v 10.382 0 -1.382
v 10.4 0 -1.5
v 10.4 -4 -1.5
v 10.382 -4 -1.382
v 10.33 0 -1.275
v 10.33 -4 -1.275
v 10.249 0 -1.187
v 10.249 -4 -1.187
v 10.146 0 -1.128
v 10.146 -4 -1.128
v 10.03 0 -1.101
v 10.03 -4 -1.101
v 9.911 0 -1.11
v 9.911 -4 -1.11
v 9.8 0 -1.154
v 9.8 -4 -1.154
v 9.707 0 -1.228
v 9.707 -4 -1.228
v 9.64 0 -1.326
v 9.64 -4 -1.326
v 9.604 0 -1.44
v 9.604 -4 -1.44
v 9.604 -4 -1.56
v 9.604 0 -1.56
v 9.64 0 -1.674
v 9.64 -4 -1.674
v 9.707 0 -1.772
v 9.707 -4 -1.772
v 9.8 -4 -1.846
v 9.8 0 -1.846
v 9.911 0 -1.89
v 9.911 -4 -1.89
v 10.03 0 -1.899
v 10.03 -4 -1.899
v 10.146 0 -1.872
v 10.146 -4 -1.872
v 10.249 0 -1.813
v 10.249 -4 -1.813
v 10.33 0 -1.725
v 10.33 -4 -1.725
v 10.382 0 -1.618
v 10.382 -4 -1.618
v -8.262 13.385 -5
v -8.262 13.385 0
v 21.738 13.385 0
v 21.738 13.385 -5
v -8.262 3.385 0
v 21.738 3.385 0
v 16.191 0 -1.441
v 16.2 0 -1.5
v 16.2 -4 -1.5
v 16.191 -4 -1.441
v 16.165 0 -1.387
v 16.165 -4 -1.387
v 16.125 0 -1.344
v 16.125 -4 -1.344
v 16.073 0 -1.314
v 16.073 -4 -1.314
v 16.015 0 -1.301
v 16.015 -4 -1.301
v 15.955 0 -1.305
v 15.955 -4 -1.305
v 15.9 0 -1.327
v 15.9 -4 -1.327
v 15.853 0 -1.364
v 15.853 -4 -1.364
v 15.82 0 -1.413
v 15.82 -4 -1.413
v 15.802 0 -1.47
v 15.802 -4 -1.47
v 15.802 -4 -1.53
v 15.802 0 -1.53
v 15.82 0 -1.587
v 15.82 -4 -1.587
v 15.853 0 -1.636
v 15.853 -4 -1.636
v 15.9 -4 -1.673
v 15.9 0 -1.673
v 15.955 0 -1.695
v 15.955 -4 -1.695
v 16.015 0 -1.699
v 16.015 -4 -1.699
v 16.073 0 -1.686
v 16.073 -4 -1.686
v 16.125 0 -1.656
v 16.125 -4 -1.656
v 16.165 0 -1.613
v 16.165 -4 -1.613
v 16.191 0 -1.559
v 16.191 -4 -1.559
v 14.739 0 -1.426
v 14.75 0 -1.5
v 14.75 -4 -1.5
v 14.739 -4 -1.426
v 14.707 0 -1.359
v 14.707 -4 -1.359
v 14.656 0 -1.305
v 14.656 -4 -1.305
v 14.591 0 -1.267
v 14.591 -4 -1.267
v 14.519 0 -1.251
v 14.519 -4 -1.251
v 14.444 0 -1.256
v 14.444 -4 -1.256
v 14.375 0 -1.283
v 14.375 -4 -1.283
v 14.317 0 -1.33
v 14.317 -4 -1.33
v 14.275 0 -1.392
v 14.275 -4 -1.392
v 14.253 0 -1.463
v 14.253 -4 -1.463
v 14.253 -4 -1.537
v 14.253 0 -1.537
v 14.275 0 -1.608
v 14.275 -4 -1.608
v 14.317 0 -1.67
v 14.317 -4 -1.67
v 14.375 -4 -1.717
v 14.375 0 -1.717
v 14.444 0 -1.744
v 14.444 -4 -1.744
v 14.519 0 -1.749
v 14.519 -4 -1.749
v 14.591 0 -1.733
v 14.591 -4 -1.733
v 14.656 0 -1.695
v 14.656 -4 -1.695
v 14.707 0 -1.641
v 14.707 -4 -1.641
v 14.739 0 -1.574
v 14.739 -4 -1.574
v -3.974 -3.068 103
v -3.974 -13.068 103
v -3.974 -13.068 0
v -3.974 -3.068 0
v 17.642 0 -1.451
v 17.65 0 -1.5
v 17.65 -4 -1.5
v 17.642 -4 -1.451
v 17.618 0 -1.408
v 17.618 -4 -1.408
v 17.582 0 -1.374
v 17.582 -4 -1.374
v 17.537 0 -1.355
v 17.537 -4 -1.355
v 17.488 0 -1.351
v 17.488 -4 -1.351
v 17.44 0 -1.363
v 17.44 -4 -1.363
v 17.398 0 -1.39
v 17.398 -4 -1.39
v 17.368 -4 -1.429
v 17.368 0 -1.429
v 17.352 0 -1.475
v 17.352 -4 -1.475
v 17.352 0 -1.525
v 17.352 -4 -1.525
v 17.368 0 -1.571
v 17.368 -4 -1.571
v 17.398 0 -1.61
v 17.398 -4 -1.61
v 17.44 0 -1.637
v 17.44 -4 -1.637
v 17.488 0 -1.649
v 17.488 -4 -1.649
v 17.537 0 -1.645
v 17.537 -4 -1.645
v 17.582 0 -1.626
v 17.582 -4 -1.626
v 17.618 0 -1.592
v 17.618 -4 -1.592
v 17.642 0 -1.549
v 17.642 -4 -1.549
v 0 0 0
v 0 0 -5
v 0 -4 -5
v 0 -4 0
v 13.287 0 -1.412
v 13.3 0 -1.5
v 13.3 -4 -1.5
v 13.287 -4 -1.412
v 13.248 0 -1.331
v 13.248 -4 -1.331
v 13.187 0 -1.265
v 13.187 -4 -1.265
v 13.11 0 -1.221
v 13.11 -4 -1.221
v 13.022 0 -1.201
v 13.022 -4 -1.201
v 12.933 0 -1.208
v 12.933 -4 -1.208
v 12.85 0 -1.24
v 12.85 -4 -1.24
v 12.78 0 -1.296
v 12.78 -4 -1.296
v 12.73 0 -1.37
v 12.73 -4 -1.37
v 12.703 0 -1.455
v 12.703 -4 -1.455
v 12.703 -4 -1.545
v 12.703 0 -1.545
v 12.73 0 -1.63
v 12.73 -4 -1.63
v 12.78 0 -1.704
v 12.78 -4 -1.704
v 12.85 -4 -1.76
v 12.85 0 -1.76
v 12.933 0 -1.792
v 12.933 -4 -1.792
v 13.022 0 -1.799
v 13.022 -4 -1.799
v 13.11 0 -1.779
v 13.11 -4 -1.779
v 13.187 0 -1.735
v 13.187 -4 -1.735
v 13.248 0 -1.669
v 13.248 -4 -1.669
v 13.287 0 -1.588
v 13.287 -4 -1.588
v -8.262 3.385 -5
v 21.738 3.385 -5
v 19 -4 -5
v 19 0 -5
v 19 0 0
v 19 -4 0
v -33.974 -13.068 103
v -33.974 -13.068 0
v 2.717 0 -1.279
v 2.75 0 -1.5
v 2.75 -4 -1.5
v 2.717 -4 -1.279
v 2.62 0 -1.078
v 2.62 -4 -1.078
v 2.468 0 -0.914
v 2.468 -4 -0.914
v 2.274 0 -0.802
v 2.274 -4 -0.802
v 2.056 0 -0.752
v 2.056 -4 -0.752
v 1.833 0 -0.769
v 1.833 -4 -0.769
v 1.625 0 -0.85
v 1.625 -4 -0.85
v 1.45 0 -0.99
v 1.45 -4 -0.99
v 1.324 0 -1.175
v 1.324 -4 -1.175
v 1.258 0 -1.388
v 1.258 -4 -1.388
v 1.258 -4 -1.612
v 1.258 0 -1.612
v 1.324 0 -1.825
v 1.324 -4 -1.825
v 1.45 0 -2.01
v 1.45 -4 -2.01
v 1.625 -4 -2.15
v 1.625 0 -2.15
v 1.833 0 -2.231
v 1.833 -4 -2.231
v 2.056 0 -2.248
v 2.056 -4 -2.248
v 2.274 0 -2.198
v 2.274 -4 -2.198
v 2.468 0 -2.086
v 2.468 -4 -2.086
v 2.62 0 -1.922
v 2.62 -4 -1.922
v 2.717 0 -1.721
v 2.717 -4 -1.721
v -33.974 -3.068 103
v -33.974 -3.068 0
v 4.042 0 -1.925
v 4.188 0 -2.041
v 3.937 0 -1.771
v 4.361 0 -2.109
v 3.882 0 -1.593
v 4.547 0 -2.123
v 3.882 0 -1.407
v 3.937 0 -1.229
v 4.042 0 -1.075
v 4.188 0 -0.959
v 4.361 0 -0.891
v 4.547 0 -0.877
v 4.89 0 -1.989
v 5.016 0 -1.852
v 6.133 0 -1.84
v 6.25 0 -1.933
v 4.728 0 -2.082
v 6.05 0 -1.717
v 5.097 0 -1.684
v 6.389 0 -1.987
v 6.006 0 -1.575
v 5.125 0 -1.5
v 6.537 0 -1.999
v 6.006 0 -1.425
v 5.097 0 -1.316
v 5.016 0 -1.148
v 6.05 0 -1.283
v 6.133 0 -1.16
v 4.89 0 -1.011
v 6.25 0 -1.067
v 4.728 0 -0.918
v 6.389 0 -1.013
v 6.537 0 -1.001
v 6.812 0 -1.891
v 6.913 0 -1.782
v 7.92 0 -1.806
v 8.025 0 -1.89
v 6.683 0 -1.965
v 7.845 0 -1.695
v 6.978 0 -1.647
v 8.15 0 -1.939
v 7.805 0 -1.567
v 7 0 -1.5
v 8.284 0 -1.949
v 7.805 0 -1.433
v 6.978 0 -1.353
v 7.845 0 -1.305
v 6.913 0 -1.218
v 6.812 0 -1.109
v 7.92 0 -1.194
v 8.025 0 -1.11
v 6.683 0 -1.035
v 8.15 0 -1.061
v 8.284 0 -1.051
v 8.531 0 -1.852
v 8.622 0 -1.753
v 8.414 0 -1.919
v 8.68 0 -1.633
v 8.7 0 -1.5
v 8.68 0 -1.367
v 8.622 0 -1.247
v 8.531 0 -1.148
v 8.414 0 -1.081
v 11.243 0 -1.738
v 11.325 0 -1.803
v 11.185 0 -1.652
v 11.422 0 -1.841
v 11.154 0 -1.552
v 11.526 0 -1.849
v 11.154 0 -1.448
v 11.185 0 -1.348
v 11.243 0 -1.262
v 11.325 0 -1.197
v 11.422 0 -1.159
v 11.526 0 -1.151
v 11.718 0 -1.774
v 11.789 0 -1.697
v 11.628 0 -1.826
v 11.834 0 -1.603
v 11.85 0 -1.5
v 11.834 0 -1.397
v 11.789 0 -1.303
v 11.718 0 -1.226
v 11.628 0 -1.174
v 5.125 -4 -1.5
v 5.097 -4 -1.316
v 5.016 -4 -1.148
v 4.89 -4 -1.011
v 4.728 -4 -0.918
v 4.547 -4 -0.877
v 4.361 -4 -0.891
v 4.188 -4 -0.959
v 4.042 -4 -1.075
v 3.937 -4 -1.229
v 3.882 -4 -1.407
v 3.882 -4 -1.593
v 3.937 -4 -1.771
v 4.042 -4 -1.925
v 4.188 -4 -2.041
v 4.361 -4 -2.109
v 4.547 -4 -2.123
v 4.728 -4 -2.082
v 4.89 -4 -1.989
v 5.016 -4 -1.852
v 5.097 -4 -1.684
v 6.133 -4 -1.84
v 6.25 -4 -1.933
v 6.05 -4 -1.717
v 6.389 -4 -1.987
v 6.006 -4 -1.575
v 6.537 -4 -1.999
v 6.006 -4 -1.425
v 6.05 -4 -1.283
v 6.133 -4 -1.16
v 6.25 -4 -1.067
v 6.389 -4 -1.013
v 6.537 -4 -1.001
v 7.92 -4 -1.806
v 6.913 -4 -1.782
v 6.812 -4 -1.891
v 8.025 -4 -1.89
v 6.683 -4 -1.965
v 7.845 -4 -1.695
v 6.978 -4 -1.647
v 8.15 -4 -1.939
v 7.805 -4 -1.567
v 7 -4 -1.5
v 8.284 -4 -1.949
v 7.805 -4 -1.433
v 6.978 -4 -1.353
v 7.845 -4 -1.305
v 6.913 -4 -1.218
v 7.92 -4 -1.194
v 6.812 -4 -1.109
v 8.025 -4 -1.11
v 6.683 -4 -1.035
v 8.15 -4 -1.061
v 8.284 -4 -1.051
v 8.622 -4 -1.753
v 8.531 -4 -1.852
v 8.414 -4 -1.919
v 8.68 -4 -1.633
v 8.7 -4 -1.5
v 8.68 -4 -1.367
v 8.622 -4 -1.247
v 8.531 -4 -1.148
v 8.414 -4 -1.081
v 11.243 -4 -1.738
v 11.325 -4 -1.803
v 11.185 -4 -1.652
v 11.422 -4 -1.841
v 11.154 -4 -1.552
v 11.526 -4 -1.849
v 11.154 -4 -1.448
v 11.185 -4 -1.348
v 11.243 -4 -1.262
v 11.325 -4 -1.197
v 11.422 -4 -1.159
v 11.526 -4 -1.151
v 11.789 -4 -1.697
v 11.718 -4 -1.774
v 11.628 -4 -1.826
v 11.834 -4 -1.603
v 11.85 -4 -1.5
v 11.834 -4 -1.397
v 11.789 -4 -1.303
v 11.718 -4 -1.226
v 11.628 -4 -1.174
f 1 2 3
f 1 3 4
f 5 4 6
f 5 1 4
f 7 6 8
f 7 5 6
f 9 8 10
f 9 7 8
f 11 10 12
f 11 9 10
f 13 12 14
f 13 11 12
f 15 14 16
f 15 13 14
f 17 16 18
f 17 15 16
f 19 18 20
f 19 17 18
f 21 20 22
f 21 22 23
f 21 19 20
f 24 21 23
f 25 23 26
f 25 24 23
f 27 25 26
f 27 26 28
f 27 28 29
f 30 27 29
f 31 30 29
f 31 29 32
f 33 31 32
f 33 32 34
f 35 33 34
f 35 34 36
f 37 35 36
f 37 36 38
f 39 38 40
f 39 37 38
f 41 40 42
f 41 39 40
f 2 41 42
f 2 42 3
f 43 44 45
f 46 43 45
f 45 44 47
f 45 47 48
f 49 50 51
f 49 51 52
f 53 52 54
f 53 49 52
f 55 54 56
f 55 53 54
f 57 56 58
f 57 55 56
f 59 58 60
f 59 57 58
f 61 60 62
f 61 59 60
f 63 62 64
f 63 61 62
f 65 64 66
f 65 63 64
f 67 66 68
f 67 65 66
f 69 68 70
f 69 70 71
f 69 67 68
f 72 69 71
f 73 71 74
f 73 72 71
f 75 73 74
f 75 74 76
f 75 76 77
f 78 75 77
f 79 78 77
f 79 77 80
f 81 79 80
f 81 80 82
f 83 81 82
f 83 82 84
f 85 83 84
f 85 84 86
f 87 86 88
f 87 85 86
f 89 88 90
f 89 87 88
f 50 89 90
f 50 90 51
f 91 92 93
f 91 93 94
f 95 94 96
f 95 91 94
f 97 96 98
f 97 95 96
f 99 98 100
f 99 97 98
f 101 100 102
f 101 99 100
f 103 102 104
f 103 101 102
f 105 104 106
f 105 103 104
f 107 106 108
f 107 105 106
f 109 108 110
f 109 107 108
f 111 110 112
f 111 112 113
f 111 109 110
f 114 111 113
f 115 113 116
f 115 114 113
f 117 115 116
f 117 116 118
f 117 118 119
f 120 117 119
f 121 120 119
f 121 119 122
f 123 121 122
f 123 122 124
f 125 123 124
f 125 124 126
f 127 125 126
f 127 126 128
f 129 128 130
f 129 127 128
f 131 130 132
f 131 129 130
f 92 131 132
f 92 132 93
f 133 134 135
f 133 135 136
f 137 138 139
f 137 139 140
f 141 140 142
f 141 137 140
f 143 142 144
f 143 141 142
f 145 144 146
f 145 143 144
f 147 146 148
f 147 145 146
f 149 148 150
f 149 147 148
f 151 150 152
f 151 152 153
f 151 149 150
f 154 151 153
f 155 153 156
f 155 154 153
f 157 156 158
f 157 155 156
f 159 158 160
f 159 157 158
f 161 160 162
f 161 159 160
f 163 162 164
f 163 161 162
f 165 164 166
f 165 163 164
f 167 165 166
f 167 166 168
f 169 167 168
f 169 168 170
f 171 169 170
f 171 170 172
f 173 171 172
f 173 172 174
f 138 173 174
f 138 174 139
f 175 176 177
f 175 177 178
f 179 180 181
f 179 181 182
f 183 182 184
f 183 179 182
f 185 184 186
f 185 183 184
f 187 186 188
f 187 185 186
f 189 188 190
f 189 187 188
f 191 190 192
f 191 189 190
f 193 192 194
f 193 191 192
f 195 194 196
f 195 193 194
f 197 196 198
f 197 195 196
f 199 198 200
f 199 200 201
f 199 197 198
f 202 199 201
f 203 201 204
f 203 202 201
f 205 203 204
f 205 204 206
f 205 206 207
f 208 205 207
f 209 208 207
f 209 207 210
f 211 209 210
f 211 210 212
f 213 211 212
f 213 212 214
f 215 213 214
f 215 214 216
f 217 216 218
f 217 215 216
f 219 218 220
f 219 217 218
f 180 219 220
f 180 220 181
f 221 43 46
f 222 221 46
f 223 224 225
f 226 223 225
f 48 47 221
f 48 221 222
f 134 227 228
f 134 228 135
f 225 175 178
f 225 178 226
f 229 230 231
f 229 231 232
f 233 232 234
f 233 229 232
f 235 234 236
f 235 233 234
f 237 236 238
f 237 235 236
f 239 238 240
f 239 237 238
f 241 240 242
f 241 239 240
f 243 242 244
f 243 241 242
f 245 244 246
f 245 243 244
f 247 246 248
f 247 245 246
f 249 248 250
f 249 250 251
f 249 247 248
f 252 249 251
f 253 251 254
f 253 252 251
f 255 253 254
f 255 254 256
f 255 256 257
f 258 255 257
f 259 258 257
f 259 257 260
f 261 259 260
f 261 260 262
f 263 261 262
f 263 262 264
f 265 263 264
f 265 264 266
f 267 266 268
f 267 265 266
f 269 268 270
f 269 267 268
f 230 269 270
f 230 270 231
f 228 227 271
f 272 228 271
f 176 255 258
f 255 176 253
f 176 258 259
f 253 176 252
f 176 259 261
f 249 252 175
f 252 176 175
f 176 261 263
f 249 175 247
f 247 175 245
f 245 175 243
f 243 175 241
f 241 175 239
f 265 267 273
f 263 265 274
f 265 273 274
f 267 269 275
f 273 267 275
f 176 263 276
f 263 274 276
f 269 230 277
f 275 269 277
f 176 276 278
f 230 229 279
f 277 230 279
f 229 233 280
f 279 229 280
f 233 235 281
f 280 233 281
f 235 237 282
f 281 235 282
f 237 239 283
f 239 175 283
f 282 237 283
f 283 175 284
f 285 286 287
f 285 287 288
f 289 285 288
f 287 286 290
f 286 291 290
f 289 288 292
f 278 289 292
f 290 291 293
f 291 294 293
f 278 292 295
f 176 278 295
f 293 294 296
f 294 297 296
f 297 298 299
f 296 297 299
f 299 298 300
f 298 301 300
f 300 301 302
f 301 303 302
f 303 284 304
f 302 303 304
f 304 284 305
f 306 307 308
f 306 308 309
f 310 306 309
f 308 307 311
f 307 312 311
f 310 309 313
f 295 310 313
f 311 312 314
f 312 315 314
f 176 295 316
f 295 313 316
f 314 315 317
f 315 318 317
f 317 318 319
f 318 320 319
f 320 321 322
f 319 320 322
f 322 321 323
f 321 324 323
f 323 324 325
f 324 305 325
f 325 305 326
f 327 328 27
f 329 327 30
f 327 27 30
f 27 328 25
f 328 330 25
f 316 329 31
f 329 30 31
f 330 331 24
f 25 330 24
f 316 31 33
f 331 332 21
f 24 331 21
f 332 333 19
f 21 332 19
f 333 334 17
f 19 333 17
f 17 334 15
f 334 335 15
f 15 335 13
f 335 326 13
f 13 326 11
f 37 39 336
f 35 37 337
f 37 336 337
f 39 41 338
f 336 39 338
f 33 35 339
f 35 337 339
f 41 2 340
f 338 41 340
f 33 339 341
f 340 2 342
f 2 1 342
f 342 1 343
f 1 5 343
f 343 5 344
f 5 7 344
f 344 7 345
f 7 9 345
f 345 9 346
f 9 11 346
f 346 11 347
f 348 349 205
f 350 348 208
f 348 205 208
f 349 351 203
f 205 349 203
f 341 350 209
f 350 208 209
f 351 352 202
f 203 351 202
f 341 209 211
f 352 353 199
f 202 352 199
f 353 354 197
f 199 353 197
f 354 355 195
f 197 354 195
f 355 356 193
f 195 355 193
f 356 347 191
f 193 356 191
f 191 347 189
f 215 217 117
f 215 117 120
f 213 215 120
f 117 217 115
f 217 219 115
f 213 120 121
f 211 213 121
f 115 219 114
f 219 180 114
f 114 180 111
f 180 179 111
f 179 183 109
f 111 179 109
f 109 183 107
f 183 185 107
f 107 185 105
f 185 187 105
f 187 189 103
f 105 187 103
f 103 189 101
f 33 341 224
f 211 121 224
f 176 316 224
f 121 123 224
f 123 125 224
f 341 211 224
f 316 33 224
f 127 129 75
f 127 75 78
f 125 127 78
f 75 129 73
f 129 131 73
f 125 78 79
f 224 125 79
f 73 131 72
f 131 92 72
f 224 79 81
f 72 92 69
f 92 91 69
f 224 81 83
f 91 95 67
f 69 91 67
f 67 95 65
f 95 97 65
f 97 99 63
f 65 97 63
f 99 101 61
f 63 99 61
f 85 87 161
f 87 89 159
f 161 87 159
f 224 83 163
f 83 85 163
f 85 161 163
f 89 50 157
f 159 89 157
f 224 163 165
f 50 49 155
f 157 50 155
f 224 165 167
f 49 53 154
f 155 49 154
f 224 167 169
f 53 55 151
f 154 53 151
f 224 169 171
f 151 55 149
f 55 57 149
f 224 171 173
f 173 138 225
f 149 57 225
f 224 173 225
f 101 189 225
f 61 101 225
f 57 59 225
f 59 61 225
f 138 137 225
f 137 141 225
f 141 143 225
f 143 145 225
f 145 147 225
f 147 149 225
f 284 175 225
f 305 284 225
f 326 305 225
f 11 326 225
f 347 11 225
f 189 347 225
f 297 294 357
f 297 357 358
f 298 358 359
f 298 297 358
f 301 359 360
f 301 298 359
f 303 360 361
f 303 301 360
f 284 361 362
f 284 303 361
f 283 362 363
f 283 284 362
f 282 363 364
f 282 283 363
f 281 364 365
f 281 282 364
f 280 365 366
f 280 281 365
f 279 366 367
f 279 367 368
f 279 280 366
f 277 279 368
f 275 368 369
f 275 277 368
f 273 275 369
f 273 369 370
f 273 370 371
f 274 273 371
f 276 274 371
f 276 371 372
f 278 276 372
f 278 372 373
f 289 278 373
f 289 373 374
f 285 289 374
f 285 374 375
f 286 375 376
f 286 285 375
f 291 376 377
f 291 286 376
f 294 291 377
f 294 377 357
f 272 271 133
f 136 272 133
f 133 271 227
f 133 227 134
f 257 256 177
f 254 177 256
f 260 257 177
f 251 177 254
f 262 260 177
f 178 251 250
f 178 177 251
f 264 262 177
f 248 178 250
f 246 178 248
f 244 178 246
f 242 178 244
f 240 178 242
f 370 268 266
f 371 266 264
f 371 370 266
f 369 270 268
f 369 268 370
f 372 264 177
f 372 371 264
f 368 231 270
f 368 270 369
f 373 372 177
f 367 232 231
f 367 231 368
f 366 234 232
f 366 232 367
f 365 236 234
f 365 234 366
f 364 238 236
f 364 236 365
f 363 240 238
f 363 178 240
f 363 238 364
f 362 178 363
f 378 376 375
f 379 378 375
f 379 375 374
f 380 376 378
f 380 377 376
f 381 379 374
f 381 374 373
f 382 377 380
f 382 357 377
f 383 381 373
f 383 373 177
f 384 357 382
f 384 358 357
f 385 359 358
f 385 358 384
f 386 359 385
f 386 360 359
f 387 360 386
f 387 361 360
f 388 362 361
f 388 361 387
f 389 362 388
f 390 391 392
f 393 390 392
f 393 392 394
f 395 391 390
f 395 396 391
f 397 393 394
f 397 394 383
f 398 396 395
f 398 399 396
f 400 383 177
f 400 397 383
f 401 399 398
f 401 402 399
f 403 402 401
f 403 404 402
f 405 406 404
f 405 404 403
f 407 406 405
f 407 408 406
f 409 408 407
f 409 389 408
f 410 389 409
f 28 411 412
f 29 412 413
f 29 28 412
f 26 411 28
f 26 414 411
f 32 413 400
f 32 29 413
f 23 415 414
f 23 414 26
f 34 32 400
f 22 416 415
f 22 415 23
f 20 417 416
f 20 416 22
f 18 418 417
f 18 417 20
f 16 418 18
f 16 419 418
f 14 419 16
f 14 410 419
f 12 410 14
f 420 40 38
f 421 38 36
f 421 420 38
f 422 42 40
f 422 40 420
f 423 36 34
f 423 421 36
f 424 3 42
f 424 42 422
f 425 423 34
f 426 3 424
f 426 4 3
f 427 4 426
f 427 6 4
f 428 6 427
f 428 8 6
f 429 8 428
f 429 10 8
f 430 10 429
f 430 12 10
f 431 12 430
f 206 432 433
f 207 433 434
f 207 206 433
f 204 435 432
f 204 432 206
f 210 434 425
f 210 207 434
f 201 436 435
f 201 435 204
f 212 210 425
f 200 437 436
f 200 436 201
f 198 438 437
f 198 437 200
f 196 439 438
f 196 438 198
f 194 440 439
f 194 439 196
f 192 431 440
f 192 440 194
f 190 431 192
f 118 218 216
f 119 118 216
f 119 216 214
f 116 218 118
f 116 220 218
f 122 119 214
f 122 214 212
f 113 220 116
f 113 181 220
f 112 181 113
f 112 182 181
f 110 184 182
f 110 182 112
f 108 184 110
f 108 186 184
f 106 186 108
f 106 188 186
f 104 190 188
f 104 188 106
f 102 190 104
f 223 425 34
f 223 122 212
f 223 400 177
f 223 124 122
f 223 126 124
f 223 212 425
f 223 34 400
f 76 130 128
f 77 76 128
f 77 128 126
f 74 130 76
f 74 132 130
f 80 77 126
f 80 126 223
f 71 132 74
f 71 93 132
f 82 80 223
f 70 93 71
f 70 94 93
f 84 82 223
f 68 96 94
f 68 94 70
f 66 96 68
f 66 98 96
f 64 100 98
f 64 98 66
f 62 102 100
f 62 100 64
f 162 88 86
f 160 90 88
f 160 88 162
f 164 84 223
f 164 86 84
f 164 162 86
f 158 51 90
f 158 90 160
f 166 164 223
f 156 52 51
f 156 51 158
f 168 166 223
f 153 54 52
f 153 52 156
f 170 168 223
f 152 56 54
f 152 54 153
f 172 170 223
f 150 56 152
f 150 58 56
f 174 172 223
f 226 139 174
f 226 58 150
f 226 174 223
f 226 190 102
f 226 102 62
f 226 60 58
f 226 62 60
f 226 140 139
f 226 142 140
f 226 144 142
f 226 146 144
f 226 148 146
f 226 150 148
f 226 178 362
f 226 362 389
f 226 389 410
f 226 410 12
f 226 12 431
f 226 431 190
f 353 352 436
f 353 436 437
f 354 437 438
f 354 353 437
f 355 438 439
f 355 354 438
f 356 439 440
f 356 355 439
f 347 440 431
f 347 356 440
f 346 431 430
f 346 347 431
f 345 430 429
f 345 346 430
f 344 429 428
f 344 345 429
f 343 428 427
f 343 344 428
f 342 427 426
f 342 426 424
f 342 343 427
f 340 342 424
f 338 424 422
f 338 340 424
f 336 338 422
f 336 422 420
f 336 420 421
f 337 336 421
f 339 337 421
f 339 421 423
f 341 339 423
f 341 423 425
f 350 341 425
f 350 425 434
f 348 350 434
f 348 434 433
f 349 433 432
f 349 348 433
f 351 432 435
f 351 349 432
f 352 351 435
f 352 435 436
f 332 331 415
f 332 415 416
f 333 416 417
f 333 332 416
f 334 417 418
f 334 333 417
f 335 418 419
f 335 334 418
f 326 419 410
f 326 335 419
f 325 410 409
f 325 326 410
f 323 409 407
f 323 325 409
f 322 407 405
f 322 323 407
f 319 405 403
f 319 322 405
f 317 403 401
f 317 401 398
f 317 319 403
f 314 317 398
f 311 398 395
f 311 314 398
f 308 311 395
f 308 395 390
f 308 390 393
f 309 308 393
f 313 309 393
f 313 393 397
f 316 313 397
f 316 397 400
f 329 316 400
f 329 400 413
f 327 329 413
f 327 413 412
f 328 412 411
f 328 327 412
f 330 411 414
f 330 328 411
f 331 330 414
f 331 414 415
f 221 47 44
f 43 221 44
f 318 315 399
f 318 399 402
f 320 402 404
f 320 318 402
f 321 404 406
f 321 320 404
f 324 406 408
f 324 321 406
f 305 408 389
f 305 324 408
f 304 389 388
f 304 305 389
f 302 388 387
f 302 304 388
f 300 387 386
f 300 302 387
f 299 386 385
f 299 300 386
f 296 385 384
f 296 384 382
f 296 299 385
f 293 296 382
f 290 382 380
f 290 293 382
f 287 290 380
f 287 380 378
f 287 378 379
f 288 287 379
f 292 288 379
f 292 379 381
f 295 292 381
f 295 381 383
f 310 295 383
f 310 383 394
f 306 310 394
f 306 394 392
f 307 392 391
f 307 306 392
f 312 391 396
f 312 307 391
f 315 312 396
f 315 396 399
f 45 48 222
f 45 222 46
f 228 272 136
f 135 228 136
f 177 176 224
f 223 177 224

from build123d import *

# Parameters (mm, degrees)
F0_W     = 19
F0_H     = 5
F0_R     = 0.75
F0_R_2   = 0.625
F0_R_3   = 0.5
F0_R_4   = 0.45
F0_R_5   = 0.4
F0_R_6   = 0.35
F0_R_7   = 0.3
F0_R_8   = 0.25
F0_R_9   = 0.2
F0_R_10  = 0.15
F1_DEPTH = 4
F2_W     = 30
F2_H     = 10
F3_DEPTH = 5
F4_W     = 30
F4_H     = 10
F5_DEPTH = 103


with BuildPart() as f1:
    # F0 (on Front) → F1 (new body)
    with BuildSketch(Plane.XZ):
        with Locations((9.5, -2.5)):
            Rectangle(F0_W, F0_H)
        with Locations((2, -1.5)):
            Circle(F0_R, mode=Mode.SUBTRACT)
        with Locations((4.5, -1.5)):
            Circle(F0_R_2, mode=Mode.SUBTRACT)
        with Locations((6.5, -1.5)):
            Circle(F0_R_3, mode=Mode.SUBTRACT)
        with Locations((8.25, -1.5)):
            Circle(F0_R_4, mode=Mode.SUBTRACT)
        with Locations((10, -1.5)):
            Circle(F0_R_5, mode=Mode.SUBTRACT)
        with Locations((11.5, -1.5)):
            Circle(F0_R_6, mode=Mode.SUBTRACT)
        with Locations((13, -1.5)):
            Circle(F0_R_7, mode=Mode.SUBTRACT)
        with Locations((14.5, -1.5)):
            Circle(F0_R_8, mode=Mode.SUBTRACT)
        with Locations((16, -1.5)):
            Circle(F0_R_9, mode=Mode.SUBTRACT)
        with Locations((17.5, -1.5)):
            Circle(F0_R_10, mode=Mode.SUBTRACT)
    extrude(amount=F1_DEPTH)


with BuildPart() as f3:
    # F2 (on Top) → F3 (new body)
    with BuildSketch(Plane.XY):
        with Locations((6.738469, 8.385124)):
            Rectangle(F2_W, F2_H)
    extrude(amount=-F3_DEPTH)


with BuildPart() as f5:
    # F4 (on Top) → F5 (new body)
    with BuildSketch(Plane.XY):
        with Locations((-18.974167, -8.067785)):
            Rectangle(F4_W, F4_H)
    extrude(amount=F5_DEPTH)


solid = Compound([f1.part, f3.part, f5.part])
